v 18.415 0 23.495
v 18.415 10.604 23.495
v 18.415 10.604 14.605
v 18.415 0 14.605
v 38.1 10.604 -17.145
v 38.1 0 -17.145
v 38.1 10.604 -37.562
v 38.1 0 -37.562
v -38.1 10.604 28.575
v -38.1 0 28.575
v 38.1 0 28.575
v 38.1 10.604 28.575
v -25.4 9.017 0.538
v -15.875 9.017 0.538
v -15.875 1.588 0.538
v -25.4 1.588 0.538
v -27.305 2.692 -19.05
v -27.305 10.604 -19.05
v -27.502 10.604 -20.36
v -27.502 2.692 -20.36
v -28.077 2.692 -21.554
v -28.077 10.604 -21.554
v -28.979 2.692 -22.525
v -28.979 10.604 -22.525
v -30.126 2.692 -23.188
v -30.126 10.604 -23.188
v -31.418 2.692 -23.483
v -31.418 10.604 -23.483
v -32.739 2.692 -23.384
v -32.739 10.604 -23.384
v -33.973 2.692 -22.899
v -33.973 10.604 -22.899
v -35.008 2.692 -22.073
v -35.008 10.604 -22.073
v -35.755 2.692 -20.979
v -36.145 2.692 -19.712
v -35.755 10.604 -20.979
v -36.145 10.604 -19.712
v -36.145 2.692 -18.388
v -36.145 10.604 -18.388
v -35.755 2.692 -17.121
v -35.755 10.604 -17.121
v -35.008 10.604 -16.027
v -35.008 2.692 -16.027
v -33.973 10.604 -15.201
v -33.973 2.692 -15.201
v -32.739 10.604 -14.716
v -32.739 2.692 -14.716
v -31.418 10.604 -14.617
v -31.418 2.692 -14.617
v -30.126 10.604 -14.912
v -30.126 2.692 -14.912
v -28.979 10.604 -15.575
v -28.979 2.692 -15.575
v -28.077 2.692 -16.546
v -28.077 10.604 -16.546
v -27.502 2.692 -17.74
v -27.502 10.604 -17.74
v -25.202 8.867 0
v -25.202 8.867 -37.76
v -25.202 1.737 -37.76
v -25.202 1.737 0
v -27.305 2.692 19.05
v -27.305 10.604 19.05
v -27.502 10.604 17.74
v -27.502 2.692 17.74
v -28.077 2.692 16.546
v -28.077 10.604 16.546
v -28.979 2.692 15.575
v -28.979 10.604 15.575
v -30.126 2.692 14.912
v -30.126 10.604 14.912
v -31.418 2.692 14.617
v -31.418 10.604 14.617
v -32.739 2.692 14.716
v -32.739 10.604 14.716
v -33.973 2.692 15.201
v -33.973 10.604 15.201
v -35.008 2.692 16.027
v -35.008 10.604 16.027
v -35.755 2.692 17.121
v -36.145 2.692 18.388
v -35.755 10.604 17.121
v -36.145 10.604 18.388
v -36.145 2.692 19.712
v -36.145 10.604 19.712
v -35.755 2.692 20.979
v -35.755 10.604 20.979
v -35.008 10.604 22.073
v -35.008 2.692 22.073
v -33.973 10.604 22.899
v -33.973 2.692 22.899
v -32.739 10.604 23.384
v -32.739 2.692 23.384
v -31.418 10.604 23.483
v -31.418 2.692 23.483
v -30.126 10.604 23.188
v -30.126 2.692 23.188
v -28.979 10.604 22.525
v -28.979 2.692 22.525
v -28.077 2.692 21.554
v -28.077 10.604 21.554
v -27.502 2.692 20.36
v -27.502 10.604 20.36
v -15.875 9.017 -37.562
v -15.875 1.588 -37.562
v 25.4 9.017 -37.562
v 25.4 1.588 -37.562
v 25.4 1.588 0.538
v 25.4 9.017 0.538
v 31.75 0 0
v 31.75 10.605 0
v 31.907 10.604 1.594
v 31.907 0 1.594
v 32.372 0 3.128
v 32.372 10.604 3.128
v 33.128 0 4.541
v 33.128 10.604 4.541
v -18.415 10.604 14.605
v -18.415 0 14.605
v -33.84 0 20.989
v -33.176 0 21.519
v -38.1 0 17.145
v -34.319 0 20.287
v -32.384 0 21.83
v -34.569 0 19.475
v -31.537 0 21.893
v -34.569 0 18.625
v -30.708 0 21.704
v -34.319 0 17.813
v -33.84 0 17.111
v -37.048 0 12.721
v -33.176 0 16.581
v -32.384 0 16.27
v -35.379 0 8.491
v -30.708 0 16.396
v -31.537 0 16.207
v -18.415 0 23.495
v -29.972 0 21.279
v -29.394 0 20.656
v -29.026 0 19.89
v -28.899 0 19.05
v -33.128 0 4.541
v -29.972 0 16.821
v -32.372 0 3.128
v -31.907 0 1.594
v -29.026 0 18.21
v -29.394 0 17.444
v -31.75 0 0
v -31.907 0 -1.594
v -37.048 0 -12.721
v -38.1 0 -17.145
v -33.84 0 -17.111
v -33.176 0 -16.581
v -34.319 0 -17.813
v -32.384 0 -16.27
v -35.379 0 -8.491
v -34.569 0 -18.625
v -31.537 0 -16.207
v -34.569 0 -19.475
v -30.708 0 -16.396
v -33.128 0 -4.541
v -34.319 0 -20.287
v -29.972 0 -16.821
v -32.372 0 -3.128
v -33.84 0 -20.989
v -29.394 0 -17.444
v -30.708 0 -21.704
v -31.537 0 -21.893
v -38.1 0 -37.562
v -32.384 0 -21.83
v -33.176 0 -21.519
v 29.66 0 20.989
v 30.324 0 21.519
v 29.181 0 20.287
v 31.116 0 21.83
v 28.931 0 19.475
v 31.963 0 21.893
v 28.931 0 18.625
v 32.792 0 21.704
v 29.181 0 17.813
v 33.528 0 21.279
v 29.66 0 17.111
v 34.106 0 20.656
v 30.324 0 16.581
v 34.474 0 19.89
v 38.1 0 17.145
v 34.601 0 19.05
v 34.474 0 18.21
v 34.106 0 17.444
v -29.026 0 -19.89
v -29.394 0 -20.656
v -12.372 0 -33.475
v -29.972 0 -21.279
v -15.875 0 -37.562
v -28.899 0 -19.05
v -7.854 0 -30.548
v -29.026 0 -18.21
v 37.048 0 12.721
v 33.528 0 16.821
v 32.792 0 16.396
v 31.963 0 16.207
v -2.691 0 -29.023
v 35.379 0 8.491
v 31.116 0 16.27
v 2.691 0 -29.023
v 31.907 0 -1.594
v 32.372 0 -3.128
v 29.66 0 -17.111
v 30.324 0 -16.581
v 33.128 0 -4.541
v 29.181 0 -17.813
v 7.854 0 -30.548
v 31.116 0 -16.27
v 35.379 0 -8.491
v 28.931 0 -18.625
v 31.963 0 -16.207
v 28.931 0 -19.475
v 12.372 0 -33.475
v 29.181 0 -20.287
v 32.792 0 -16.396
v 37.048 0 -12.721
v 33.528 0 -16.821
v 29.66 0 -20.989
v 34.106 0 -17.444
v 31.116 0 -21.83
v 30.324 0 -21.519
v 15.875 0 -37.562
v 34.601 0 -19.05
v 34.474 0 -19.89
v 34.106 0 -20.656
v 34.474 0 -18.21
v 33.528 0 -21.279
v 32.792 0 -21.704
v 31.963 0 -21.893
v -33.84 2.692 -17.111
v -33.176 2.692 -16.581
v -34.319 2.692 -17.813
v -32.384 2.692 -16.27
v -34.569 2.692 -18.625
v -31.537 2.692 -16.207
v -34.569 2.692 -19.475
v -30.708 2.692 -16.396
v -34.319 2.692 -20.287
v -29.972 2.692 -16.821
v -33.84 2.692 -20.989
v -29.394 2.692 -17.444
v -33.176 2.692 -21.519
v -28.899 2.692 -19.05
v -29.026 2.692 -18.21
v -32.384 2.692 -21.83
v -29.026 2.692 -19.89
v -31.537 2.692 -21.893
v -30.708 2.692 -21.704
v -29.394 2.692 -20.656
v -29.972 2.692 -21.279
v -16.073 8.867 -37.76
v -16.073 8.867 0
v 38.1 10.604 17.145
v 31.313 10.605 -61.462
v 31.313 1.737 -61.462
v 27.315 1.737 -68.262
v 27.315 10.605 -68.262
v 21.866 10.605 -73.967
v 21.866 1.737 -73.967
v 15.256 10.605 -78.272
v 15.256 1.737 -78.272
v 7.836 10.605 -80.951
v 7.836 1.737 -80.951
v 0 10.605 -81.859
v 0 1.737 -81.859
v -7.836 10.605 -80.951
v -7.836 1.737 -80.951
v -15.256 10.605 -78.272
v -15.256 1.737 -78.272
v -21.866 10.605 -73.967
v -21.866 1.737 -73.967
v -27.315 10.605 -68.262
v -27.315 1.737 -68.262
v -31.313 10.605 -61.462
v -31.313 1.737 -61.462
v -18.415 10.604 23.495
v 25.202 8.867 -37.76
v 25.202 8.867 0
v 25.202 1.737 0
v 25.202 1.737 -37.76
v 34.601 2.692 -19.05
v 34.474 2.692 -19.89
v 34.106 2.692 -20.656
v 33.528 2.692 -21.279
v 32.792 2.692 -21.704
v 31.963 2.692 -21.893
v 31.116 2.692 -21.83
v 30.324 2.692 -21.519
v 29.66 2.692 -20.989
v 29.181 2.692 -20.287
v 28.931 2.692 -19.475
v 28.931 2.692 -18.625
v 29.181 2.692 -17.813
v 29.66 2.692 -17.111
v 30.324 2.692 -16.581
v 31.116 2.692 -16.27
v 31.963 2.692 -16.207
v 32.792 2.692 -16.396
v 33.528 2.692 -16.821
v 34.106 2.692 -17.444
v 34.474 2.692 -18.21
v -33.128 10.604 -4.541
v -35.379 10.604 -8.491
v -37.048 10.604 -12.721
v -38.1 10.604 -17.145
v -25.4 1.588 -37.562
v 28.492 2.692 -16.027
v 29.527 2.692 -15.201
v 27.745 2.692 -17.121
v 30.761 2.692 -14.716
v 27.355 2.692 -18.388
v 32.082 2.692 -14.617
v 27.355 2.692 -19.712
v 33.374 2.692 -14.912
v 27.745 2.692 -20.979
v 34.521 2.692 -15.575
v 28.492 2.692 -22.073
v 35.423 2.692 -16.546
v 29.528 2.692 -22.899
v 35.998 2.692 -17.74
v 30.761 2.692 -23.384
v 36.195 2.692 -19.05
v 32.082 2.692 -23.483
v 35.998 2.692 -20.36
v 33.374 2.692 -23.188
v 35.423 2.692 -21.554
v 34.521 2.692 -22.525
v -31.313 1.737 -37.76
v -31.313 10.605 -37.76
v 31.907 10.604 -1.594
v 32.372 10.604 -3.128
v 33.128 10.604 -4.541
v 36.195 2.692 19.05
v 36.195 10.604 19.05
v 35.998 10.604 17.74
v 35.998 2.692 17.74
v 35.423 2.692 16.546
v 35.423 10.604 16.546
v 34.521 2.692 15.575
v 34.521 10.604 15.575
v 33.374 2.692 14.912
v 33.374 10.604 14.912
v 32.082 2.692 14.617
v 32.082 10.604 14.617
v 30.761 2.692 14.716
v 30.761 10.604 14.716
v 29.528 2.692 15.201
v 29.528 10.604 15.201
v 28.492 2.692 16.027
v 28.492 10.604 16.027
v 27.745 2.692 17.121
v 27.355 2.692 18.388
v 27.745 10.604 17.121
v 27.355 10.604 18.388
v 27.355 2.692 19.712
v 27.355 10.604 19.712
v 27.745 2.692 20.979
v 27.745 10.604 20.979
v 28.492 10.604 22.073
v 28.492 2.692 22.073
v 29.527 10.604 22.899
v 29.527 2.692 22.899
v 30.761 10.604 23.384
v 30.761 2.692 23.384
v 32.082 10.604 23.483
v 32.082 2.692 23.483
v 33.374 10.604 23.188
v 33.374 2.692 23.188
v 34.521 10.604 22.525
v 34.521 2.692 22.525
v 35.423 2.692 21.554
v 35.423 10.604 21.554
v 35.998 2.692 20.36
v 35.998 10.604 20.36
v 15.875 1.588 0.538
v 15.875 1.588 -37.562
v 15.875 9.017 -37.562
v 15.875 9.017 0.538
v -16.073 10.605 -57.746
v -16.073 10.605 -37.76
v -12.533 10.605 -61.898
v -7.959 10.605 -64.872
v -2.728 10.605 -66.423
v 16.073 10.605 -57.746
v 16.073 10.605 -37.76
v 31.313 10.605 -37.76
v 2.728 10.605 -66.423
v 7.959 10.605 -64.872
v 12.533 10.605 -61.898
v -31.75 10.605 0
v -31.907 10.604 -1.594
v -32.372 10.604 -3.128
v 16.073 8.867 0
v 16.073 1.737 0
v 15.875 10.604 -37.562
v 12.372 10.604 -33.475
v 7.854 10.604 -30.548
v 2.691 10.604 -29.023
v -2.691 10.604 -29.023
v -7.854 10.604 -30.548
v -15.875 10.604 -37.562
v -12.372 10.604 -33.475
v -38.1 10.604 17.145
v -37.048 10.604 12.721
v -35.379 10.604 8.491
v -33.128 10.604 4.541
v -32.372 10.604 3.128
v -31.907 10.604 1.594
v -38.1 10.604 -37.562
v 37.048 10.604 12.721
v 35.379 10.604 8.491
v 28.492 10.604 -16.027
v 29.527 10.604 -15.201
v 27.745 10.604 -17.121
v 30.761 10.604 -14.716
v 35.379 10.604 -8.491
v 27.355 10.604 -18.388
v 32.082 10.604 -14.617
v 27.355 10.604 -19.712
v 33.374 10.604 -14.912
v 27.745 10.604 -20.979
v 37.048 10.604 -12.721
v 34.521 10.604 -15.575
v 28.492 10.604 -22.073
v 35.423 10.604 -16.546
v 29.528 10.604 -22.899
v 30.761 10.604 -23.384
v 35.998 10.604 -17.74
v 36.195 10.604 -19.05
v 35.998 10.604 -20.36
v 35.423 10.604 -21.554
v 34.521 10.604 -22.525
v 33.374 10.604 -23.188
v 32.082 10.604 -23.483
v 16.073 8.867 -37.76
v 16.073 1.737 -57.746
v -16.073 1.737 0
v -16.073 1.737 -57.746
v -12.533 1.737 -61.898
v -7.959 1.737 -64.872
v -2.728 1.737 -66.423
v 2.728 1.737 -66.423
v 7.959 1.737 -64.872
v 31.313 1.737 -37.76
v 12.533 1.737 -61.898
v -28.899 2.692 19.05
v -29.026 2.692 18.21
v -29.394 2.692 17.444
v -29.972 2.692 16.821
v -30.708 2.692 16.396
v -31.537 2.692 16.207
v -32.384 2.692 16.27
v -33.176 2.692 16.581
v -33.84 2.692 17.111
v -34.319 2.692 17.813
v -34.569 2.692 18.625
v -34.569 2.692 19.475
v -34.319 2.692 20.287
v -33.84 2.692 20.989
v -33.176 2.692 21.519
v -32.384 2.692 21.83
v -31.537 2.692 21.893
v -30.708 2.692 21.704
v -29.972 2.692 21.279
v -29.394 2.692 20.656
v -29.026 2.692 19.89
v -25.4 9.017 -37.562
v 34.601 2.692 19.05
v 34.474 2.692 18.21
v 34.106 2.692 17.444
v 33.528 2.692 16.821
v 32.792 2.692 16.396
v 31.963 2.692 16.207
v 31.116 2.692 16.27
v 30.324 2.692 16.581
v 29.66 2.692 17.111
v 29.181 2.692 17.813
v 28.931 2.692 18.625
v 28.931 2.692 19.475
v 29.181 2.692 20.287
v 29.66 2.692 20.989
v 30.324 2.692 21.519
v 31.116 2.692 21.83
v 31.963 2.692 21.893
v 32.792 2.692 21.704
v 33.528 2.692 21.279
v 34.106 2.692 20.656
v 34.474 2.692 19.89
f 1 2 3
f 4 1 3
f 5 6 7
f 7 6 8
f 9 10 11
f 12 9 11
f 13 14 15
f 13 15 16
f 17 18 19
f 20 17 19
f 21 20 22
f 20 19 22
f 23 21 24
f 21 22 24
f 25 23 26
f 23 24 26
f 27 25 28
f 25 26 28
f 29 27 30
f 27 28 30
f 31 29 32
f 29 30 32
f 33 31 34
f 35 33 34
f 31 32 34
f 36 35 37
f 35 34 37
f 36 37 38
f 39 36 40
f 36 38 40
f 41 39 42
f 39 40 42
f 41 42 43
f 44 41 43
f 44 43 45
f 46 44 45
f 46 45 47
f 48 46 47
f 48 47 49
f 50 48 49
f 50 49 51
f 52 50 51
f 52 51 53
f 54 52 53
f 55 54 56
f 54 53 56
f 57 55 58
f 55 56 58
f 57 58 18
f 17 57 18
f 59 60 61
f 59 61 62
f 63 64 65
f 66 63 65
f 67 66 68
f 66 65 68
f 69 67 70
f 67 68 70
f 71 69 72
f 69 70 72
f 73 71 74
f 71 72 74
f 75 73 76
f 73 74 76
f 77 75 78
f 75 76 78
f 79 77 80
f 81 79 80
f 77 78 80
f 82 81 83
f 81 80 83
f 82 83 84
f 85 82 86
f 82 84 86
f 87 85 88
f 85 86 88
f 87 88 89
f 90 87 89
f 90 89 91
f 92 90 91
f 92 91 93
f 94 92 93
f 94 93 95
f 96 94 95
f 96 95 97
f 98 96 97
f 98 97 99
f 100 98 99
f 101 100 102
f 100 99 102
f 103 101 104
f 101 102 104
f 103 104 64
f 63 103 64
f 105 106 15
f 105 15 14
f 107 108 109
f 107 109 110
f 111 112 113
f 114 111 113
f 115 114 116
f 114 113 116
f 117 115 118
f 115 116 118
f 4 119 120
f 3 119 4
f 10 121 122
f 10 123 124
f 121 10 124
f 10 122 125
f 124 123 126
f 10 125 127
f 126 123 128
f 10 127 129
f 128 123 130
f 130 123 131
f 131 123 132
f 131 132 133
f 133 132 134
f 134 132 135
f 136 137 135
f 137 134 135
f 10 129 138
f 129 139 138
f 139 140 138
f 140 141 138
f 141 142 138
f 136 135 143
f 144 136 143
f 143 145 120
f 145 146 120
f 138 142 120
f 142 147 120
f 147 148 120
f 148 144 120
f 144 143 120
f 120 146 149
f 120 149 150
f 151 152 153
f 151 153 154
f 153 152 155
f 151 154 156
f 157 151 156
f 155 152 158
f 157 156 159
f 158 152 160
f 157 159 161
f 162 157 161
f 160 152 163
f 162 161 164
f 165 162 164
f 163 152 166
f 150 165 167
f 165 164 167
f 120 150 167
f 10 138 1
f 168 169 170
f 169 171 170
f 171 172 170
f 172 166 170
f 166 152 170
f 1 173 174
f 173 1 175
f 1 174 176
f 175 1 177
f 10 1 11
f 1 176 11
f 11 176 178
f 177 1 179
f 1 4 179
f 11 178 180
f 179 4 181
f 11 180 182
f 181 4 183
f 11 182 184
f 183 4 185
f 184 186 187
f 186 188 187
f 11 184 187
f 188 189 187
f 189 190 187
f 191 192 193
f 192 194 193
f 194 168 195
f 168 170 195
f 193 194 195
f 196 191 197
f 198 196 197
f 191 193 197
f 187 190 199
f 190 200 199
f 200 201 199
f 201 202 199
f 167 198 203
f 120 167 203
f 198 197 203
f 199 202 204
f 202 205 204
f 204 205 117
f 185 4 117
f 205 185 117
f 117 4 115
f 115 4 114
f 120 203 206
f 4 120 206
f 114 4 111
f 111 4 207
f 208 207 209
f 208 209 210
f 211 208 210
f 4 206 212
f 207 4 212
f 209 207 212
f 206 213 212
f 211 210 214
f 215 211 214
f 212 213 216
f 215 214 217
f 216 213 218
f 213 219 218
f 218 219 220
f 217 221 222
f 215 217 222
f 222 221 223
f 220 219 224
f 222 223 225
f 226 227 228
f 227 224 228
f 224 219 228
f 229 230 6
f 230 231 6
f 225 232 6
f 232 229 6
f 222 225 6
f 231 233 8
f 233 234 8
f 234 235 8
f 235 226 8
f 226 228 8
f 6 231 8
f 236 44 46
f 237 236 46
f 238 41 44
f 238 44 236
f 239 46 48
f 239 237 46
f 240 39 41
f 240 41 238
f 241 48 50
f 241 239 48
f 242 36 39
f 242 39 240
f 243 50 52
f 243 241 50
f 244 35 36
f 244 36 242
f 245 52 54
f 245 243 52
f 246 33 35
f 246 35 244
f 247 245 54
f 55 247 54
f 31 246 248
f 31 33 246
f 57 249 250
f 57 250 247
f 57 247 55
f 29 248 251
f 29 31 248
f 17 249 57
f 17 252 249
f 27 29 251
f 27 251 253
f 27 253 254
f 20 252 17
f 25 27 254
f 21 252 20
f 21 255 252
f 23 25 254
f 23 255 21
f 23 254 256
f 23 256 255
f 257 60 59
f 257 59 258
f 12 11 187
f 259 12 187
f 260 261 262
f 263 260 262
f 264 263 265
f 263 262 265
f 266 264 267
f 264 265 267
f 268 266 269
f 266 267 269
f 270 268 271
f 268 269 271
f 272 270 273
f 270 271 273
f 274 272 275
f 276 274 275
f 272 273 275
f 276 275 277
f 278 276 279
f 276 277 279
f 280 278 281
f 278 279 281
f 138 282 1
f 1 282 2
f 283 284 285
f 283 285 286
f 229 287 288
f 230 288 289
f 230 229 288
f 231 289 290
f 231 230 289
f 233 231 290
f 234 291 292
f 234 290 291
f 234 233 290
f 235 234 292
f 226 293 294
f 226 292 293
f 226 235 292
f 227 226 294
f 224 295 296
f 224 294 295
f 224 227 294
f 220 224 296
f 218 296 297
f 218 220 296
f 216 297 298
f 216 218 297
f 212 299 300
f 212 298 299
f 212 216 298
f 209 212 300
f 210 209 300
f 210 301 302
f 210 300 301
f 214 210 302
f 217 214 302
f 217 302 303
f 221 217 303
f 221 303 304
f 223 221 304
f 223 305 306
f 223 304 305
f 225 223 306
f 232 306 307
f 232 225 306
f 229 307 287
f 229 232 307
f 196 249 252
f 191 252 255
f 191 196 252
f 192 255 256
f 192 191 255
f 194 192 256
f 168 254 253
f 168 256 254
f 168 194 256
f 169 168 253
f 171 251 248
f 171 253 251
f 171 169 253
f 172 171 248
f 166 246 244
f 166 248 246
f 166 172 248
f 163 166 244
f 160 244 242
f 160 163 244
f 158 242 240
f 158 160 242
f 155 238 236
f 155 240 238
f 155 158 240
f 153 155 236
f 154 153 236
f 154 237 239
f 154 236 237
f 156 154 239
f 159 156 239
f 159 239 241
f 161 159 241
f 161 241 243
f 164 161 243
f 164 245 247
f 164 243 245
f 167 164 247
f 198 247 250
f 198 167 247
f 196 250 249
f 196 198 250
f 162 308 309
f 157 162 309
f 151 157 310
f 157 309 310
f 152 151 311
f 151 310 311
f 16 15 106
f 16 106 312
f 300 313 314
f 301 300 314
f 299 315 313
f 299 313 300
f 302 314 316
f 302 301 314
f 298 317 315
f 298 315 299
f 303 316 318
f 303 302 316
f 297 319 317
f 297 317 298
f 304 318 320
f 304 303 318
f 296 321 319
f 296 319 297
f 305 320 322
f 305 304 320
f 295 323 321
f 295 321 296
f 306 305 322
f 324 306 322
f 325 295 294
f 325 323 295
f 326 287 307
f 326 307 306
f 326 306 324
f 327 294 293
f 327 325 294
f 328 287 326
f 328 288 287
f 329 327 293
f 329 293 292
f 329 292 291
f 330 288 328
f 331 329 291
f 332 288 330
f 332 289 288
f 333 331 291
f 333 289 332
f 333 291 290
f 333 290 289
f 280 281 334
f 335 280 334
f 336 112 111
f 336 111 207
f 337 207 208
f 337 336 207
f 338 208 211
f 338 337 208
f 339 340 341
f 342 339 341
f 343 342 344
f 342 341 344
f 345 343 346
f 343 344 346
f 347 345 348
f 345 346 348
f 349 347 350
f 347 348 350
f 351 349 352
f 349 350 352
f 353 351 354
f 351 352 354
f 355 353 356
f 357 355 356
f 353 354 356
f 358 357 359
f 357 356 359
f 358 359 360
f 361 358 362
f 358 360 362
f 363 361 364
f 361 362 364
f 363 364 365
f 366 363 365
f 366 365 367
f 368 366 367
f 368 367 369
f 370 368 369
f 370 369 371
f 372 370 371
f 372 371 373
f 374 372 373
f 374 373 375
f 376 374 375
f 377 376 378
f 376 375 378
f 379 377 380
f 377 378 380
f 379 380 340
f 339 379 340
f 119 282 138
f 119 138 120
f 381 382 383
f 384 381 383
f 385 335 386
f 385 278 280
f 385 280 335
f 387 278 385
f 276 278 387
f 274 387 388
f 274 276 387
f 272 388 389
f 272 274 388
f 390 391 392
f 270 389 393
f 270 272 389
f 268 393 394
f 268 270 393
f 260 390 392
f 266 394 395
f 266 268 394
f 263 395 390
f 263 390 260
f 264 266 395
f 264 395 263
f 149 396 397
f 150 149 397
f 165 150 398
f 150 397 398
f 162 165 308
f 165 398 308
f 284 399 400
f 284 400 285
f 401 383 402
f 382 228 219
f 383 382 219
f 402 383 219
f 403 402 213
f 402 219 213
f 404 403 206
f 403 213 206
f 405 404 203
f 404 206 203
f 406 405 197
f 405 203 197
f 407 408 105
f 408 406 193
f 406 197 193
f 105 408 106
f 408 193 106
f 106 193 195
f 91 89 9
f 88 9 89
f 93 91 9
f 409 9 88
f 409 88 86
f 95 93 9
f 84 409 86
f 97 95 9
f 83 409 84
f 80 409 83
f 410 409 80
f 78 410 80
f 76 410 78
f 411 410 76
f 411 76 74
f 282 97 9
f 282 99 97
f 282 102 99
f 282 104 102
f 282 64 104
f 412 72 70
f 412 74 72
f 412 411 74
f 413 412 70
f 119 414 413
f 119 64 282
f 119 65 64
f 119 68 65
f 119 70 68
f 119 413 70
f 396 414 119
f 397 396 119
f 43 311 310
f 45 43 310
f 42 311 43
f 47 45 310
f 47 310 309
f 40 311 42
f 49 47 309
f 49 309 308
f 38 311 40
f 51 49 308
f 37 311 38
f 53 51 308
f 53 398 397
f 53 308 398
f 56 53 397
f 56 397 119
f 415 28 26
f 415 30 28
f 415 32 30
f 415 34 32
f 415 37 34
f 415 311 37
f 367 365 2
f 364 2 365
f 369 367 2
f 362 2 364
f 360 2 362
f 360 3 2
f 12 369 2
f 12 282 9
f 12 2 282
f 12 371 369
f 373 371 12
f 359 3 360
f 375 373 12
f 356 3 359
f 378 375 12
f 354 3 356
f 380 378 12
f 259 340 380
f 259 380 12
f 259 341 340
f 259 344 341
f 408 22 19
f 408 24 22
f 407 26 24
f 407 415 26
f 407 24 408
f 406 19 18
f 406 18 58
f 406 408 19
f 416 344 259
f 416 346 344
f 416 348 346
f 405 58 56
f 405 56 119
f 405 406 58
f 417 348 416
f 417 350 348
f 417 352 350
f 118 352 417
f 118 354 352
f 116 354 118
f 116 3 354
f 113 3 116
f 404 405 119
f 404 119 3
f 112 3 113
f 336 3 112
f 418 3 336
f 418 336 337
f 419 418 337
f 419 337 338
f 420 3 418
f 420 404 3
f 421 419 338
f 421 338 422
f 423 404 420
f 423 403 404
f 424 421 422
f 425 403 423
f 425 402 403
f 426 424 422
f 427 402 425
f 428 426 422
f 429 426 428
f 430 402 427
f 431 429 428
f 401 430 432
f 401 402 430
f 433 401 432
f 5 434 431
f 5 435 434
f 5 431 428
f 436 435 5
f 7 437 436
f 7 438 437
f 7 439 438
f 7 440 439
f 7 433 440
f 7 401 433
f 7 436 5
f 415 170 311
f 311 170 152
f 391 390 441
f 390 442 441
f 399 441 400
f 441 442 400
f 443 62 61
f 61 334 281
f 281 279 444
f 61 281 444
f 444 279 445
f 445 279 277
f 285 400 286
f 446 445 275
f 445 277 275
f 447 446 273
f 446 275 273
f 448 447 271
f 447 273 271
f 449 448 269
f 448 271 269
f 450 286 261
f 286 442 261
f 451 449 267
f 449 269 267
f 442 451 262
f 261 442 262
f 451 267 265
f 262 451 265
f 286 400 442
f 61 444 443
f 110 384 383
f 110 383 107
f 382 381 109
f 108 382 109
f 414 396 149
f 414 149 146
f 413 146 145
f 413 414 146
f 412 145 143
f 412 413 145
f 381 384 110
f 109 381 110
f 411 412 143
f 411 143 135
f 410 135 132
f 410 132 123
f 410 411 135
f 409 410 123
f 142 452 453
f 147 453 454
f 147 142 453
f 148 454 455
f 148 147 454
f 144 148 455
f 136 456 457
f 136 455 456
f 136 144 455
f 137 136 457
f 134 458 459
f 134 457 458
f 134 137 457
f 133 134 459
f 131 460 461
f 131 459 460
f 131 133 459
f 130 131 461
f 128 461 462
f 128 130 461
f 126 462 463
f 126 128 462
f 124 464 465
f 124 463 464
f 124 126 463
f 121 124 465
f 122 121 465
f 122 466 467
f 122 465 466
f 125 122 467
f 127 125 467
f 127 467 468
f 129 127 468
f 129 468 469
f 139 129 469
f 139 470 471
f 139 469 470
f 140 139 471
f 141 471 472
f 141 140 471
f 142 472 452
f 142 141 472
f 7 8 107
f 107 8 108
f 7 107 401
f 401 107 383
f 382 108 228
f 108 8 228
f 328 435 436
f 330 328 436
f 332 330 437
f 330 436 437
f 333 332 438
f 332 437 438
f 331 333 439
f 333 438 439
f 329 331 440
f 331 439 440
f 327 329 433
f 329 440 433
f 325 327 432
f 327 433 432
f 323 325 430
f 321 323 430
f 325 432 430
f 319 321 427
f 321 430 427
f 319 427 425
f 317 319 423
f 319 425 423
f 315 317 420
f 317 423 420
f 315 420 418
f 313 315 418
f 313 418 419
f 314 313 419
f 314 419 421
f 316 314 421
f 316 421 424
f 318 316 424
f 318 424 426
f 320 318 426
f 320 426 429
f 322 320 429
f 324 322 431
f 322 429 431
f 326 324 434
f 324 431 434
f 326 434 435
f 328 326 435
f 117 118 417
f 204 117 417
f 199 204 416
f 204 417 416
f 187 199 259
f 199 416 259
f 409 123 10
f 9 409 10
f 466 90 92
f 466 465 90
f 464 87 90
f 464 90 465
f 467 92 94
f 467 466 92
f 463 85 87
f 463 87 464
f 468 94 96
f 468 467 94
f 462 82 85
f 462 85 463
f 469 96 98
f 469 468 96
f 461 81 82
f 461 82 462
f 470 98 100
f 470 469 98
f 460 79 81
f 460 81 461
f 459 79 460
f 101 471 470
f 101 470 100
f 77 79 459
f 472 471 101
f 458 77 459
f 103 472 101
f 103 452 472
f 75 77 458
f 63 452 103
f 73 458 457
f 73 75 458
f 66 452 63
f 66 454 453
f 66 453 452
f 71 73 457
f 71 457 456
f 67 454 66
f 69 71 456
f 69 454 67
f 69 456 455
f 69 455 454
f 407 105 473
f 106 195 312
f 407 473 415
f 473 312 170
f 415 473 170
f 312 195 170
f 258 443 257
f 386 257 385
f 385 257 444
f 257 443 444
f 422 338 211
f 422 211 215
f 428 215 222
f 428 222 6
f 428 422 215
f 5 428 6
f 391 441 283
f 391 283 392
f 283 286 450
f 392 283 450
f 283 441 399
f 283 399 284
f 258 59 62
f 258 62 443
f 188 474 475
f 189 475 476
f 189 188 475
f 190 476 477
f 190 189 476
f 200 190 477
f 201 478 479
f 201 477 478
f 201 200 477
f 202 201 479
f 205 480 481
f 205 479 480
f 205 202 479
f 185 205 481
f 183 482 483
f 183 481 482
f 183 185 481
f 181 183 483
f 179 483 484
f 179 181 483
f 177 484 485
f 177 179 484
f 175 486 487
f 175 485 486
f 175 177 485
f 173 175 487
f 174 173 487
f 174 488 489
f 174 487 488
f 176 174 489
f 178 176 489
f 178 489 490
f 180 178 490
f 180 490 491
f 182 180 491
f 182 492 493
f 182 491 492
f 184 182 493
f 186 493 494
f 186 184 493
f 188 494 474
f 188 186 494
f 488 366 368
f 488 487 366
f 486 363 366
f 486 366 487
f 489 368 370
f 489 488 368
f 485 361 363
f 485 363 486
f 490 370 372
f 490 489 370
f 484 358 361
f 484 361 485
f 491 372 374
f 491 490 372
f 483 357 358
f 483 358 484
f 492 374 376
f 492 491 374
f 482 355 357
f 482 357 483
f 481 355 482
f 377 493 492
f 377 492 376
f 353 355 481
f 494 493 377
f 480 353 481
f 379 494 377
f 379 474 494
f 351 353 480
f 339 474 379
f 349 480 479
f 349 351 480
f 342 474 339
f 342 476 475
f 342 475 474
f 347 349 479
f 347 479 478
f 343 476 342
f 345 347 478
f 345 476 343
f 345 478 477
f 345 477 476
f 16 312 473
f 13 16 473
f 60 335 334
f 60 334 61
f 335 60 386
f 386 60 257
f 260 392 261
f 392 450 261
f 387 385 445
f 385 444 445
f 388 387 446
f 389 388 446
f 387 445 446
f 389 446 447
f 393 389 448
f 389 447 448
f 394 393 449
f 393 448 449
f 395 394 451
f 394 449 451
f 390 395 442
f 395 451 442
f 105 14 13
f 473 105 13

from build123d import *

# Parameters (mm, degrees)
SKETCH1_R            = 2.85115
BOSS_EXTRUDE1_DEPTH  = 10.6045
SKETCH2_R            = 4.445
CUT_EXTRUDE1_DEPTH   = 7.9121
SKETCH3_W            = 9.525
SKETCH3_H            = 7.4295
CUT_EXTRUDE2_DEPTH   = 38.1
CUT_EXTRUDE7_DEPTH   = 5.715
BOSS_EXTRUDE3_DEPTH  = 3.5647503
SKETCH13_W           = 36.83
SKETCH13_H           = 8.89
CUT_EXTRUDE10_DEPTH  = 11.6045
MIRROR6_COPY_1_DEPTH = 5.715
BOSS_EXTRUDE5_DEPTH  = 1.7375


with BuildPart() as part:
    # Sketch1 → Boss-Extrude1 (new body)
    with BuildSketch(Plane(origin=(0, 0, 0), x_dir=(1, 0, 0), z_dir=(0, 1, 0))):
        with BuildLine():
            Line((-38.1, -28.575), (38.1, -28.575))
            Line((38.1, -28.575), (38.1, 37.561502049))
            Line((38.1, 37.561502049), (15.875, 37.561502049))
            ThreePointArc((15.875, 37.561502049), (0, 28.829), (-15.875, 37.561502049))
            Line((-15.875, 37.561502049), (-38.1, 37.561502049))
            Line((-38.1, 37.561502049), (-38.1, -28.575))
        make_face()
        with Locations((-31.75, 19.05)):
            Circle(SKETCH1_R, mode=Mode.SUBTRACT)
        with Locations((31.75, 19.05)):
            Circle(SKETCH1_R, mode=Mode.SUBTRACT)
        with Locations((31.75, -19.05)):
            Circle(SKETCH1_R, mode=Mode.SUBTRACT)
        with Locations((-31.75, -19.05)):
            Circle(SKETCH1_R, mode=Mode.SUBTRACT)
    extrude(amount=BOSS_EXTRUDE1_DEPTH)

    # Sketch2 → Cut-Extrude1 (cut)
    with BuildSketch(Plane(origin=(0, 10.6045, 0), x_dir=(1, 0, 0), z_dir=(0, 1, 0))):
        with Locations((-31.75, 19.05)):
            Circle(SKETCH2_R)
        with Locations((31.75, 19.05)):
            Circle(SKETCH2_R)
        with Locations((31.75, -19.05)):
            Circle(SKETCH2_R)
        with Locations((-31.75, -19.05)):
            Circle(SKETCH2_R)
    extrude(amount=-CUT_EXTRUDE1_DEPTH, mode=Mode.SUBTRACT)

    # Sketch3 → Cut-Extrude2 (cut)
    with BuildSketch(Plane(origin=(0, 0, -37.561502049), x_dir=(-1, 0, 0), z_dir=(0, 0, -1))):
        with Locations((20.6375, 5.30225)):
            Rectangle(SKETCH3_W, SKETCH3_H)
    cut_extrude2 = extrude(amount=-CUT_EXTRUDE2_DEPTH, mode=Mode.SUBTRACT)

    # Mirror1: Cut-Extrude2 across plane
    add(cut_extrude2.mirror(Plane(origin=(0, 0, 0), x_dir=(0, 0, 1), z_dir=(1, 0, 0))), mode=Mode.SUBTRACT)

    # Sketch7 → Cut-Extrude7 (cut, symmetric)
    with BuildSketch(Plane(origin=(0, 5.30225, 0), x_dir=(1, 0, 0), z_dir=(0, 1, 0))):
        with BuildLine():
            Line((-38.1, 17.145), (-38.1, 0))
            Line((-38.1, 0), (-31.75, 0))
            ThreePointArc((-31.75, 0), (-32.10199393, 2.372518284), (-33.127651434, 4.540644068))
            ThreePointArc((-33.127651434, 4.540644068), (-36.288841608, 10.576532006), (-38.1, 17.145))
        make_face()
    cut_extrude7 = extrude(amount=CUT_EXTRUDE7_DEPTH, both=True, mode=Mode.SUBTRACT)

    # Mirror4: Cut-Extrude7 across plane
    add(cut_extrude7.mirror(Plane(origin=(0, 0, 0), x_dir=(0, 0, 1), z_dir=(1, 0, 0))), mode=Mode.SUBTRACT)

    # Sketch13 → Cut-Extrude10 (cut, through all)
    with BuildSketch(Plane(origin=(0, 10.6045, 0), x_dir=(1, 0, 0), z_dir=(0, 1, 0))):
        with Locations((0, -19.05)):
            Rectangle(SKETCH13_W, SKETCH13_H)
    extrude(amount=-CUT_EXTRUDE10_DEPTH, mode=Mode.SUBTRACT)

    # Mirror6: Cut-Extrude7 across plane
    add(cut_extrude7.mirror(Plane.XY), mode=Mode.SUBTRACT)

    # Mirror6 copy 1 sketch → Mirror6 copy 1 (cut, symmetric)
    with BuildSketch(Plane(origin=(0, 5.30225, 0), x_dir=(-1, 0, 0), z_dir=(0, 1, 0))):
        with BuildLine():
            Line((-38.1, 17.145), (-38.1, 0))
            Line((-38.1, 0), (-31.75, 0))
            ThreePointArc((-31.75, 0), (-32.10199393, 2.372518284), (-33.127651434, 4.540644068))
            ThreePointArc((-33.127651434, 4.540644068), (-36.288841608, 10.576532006), (-38.1, 17.145))
        make_face()
    extrude(amount=MIRROR6_COPY_1_DEPTH, both=True, mode=Mode.SUBTRACT)


with BuildPart() as body_2:
    # Sketch8 → Boss-Extrude3 (new body, symmetric)
    with BuildSketch(Plane(origin=(0, 5.30225, 0), x_dir=(1, 0, 0), z_dir=(0, 1, 0))):
        with BuildLine():
            Line((16.0734375, 57.745931917), (16.0734375, 37.759939549))
            Line((16.0734375, 37.759939549), (16.0734375, 0))
            Line((16.0734375, 0), (25.2015625, 0))
            Line((25.2015625, 0), (25.2015625, 37.759939549))
            Line((25.2015625, 37.759939549), (31.3134375, 37.759939549))
            Line((31.3134375, 37.759939549), (31.3134375, 61.462100234))
            ThreePointArc((31.3134375, 61.462100234), (0, 81.8594375), (-31.3134375, 61.462100234))
            Line((-31.3134375, 61.462100234), (-31.3134375, 37.759939549))
            Line((-31.3134375, 37.759939549), (-25.2015625, 37.759939549))
            Line((-25.2015625, 37.759939549), (-25.2015625, 0))
            Line((-25.2015625, 0), (-16.0734375, 0))
            Line((-16.0734375, 0), (-16.0734375, 37.759939549))
            Line((-16.0734375, 37.759939549), (-16.0734375, 57.745931917))
            ThreePointArc((-16.0734375, 57.745931917), (0, 66.6194375), (16.0734375, 57.745931917))
        make_face()
    extrude(amount=BOSS_EXTRUDE3_DEPTH, both=True)

    # Sketch18 → Boss-Extrude5 (add)
    with BuildSketch(Plane(origin=(0, 8.8670003, 0), x_dir=(1, 0, 0), z_dir=(0, 1, 0))):
        with BuildLine():
            Line((-31.3134375, 37.759939549), (-16.0734375, 37.759939549))
            Line((-16.0734375, 37.759939549), (-16.0734375, 57.745931917))
            ThreePointArc((-16.0734375, 57.745931917), (0, 66.6194375), (16.0734375, 57.745931917))
            Line((16.0734375, 57.745931917), (16.0734375, 37.759939549))
            Line((16.0734375, 37.759939549), (31.3134375, 37.759939549))
            Line((31.3134375, 37.759939549), (31.3134375, 61.462100234))
            ThreePointArc((31.3134375, 61.462100234), (0, 81.8594375), (-31.3134375, 61.462100234))
            Line((-31.3134375, 61.462100234), (-31.3134375, 37.759939549))
        make_face()
    extrude(amount=BOSS_EXTRUDE5_DEPTH)


solid = Compound([part.part, body_2.part])
